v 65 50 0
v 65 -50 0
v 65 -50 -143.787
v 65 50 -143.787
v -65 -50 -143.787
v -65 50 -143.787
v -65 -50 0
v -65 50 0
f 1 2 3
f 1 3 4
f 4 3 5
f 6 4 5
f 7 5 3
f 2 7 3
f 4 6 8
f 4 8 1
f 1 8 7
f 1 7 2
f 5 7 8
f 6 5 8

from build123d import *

# Parameters (mm, degrees)
F0_W     = 130
F0_H     = 100
F1_DEPTH = 180
F2_R     = 36.213203
F4_DEPTH = 115


with BuildPart() as f1:
    # F0 (on Top) → F1 (new body)
    with BuildSketch(Plane.XY):
        Rectangle(F0_W, F0_H)
    extrude(amount=-F1_DEPTH)

    # F2
    f2_edges = [f1.edges().sort_by_distance(p)[0] for p in [
        (65, 0, -180),
        (-65, 0, -180),
    ]]
    fillet(f2_edges, radius=F2_R)

    # F3 (on face) → F4 (cut)
    with BuildSketch(Plane.XZ.offset(50)):
        with BuildLine():
            ThreePointArc((28.786797, -180), (54.393398, -169.393398), (65, -143.786797))
            Line((65, -143.786797), (-65, -143.786797))
            ThreePointArc((-65, -143.786797), (-54.393398, -169.393398), (-28.786797, -180))
            Line((-28.786797, -180), (28.786797, -180))
        make_face()
    extrude(amount=-F4_DEPTH, mode=Mode.SUBTRACT)


solid = f1.part
